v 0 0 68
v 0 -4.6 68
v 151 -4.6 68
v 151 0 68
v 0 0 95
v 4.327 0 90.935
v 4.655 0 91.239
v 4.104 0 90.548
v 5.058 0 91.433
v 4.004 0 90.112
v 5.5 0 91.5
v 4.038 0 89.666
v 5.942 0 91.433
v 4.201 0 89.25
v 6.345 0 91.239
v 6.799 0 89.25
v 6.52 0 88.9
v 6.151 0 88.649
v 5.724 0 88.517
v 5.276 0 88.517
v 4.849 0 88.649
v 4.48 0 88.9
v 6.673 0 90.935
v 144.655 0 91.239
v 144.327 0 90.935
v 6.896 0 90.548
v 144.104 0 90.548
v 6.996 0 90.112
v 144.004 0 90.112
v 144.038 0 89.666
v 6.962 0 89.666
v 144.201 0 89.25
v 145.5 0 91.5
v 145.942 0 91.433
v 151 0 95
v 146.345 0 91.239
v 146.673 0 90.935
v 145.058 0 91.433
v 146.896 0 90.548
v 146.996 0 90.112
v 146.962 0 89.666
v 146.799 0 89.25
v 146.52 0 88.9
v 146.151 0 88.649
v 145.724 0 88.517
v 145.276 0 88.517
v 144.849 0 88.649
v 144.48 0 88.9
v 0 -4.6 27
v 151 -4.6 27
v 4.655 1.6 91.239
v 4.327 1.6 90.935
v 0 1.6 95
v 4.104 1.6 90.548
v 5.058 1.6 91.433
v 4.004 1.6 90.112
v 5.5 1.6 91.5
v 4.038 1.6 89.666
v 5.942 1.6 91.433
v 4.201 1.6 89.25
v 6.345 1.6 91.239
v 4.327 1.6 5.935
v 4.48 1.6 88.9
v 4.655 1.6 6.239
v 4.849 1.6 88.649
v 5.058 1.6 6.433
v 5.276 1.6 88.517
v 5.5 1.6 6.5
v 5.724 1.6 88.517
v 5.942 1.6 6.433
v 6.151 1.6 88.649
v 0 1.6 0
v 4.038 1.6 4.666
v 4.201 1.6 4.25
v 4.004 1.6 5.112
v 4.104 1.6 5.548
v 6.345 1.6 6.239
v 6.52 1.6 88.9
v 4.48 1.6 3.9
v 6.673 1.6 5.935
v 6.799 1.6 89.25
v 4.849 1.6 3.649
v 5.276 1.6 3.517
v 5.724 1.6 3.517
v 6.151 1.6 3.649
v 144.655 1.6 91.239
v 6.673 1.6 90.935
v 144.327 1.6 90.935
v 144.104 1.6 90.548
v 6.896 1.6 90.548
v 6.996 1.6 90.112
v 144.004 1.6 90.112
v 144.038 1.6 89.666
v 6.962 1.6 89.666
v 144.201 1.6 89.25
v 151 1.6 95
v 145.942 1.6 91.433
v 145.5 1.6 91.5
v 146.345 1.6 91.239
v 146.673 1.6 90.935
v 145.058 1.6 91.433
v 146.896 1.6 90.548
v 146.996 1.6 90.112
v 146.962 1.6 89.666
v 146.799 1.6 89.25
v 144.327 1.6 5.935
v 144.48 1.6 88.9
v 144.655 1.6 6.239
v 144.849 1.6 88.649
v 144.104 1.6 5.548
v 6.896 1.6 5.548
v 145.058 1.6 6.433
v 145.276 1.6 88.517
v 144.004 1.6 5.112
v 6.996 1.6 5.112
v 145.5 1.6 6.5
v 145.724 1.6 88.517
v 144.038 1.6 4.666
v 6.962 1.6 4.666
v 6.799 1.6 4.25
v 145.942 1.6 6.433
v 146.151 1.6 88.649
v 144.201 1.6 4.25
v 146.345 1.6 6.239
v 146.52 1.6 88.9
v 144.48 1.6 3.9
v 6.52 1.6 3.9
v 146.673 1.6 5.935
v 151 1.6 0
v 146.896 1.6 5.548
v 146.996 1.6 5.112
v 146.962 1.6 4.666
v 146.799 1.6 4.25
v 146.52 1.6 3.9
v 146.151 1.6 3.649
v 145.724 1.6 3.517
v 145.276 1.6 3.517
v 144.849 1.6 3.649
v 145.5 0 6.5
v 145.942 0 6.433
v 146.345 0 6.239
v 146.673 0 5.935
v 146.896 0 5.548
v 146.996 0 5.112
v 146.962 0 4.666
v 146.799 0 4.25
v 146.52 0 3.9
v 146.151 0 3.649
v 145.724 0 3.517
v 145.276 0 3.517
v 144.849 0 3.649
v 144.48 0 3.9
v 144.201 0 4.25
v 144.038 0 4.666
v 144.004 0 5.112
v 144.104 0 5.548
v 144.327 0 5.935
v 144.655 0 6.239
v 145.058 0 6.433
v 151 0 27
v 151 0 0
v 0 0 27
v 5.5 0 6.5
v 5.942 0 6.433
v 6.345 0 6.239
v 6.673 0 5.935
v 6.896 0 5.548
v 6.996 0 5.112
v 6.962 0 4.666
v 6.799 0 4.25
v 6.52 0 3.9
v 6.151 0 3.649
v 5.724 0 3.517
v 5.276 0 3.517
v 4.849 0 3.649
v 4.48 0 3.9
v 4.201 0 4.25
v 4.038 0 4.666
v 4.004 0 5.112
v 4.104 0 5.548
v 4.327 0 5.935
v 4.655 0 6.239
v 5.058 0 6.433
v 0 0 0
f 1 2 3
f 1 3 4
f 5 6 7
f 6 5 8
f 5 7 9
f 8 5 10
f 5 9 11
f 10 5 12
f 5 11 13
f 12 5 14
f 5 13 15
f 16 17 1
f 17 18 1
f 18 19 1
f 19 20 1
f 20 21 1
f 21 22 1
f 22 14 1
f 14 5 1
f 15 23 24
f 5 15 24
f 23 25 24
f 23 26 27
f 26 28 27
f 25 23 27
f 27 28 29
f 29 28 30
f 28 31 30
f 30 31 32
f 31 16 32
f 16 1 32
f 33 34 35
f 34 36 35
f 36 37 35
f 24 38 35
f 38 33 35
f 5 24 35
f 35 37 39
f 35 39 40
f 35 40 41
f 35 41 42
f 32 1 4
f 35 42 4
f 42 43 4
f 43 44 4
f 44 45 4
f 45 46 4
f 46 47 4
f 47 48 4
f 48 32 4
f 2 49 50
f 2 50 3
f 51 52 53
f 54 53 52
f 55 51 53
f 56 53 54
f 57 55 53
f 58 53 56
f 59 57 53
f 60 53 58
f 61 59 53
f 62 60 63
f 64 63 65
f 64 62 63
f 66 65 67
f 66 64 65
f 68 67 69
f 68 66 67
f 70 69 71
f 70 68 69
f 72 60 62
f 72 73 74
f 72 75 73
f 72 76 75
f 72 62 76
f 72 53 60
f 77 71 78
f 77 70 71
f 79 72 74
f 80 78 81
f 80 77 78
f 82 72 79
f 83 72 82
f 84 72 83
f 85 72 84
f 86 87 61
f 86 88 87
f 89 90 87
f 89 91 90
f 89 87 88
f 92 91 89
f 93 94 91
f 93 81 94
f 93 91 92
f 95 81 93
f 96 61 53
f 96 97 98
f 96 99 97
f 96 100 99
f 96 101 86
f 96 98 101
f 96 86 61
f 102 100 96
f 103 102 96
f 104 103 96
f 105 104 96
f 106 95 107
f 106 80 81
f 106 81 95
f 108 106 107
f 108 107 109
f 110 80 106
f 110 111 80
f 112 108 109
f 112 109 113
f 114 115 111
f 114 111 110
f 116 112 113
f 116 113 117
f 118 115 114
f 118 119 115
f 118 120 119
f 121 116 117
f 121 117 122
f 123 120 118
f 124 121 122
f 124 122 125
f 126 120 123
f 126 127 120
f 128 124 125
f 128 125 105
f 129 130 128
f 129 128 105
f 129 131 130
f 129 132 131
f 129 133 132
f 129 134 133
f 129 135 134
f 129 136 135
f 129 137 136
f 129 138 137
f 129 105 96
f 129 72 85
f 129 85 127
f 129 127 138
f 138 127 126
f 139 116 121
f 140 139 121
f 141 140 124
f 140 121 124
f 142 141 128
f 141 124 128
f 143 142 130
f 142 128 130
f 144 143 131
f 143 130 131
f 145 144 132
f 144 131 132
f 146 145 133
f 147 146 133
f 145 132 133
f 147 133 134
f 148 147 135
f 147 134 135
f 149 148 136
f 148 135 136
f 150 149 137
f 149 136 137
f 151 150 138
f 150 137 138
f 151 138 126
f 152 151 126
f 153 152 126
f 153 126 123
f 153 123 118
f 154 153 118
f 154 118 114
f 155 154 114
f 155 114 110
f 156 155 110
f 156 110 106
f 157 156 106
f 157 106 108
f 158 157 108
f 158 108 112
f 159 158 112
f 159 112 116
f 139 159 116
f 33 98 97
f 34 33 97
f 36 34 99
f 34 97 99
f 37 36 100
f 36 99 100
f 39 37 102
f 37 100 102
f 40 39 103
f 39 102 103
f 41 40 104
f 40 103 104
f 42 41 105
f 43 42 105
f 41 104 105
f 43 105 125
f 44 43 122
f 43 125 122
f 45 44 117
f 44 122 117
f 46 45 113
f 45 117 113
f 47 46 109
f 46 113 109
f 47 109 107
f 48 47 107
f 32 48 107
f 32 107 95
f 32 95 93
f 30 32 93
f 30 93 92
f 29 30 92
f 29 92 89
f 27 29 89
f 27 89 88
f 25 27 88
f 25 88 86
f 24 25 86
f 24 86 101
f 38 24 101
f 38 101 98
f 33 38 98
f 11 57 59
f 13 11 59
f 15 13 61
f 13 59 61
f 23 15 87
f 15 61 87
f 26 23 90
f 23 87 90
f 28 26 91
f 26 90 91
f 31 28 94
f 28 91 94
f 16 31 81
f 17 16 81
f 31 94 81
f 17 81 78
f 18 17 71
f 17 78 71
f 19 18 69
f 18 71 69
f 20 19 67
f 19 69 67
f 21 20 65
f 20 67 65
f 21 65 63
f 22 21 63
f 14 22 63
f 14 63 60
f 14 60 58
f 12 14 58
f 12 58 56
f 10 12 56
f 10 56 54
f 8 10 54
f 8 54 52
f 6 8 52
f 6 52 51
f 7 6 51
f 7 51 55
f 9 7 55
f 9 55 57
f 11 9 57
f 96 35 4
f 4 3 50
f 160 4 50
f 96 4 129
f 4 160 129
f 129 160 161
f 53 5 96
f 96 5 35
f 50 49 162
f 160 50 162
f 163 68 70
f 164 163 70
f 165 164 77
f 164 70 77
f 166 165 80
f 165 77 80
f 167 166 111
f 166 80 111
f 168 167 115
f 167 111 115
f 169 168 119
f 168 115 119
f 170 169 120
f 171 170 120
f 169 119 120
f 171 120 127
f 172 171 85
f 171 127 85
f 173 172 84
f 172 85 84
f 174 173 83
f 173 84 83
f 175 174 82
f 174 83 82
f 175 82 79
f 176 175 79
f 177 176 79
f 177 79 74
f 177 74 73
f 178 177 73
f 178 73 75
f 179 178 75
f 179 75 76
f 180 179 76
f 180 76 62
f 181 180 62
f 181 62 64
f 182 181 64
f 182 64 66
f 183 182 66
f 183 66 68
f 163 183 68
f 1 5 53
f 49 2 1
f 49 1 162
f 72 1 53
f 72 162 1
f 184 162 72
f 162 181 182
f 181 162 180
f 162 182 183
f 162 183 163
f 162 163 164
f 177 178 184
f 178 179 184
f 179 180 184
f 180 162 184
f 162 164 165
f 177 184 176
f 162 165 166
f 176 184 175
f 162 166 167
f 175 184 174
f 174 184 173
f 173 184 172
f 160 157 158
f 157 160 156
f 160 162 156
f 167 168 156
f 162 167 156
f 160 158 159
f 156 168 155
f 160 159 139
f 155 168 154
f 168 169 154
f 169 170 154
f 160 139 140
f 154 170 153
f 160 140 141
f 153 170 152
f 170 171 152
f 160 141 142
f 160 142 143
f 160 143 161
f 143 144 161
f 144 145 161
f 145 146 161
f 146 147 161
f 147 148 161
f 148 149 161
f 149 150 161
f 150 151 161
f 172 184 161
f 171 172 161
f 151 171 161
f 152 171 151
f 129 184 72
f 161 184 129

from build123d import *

# Parameters (mm, degrees)
SKETCH_1_W          = 151
SKETCH_1_H          = 95
EXTRUDE_1_DEPTH     = 1.6
SKETCH_2_W          = 41
SKETCH_2_H          = 4.6
EXTRUDE_2_DEPTH     = 151
SKETCH_3_R          = 1.5
CUT_EXTRUDE_1_DEPTH = 179.506134348


with BuildPart() as part:
    # 草图1 → 凸台-拉伸1 (new body)
    with BuildSketch(Plane(origin=(0, 0, 0), x_dir=(1, 0, 0), z_dir=(0, 1, 0))):
        with Locations((75.5, -47.5)):
            Rectangle(SKETCH_1_W, SKETCH_1_H)
    extrude(amount=EXTRUDE_1_DEPTH)

    # 草图2 → 凸台-拉伸2 (add)
    with BuildSketch(Plane.ZY):
        with Locations((47.5, -2.3)):
            Rectangle(SKETCH_2_W, SKETCH_2_H)
    extrude(amount=-EXTRUDE_2_DEPTH)

    # 草图3 → 切除-拉伸1 (cut, through all)
    with BuildSketch(Plane(origin=(0, 1.6, 0), x_dir=(1, 0, 0), z_dir=(0, 1, 0))):
        with Locations(Location((5.5, -5, 0), (0, 0, 270))):
            Circle(SKETCH_3_R)
        with Locations(Location((5.5, -90, 0), (0, 0, 270))):
            Circle(SKETCH_3_R)
        with Locations(Location((145.5, -90, 0), (0, 0, 270))):
            Circle(SKETCH_3_R)
        with Locations(Location((145.5, -5, 0), (0, 0, 270))):
            Circle(SKETCH_3_R)
    extrude(amount=-CUT_EXTRUDE_1_DEPTH, mode=Mode.SUBTRACT)


solid = part.part
